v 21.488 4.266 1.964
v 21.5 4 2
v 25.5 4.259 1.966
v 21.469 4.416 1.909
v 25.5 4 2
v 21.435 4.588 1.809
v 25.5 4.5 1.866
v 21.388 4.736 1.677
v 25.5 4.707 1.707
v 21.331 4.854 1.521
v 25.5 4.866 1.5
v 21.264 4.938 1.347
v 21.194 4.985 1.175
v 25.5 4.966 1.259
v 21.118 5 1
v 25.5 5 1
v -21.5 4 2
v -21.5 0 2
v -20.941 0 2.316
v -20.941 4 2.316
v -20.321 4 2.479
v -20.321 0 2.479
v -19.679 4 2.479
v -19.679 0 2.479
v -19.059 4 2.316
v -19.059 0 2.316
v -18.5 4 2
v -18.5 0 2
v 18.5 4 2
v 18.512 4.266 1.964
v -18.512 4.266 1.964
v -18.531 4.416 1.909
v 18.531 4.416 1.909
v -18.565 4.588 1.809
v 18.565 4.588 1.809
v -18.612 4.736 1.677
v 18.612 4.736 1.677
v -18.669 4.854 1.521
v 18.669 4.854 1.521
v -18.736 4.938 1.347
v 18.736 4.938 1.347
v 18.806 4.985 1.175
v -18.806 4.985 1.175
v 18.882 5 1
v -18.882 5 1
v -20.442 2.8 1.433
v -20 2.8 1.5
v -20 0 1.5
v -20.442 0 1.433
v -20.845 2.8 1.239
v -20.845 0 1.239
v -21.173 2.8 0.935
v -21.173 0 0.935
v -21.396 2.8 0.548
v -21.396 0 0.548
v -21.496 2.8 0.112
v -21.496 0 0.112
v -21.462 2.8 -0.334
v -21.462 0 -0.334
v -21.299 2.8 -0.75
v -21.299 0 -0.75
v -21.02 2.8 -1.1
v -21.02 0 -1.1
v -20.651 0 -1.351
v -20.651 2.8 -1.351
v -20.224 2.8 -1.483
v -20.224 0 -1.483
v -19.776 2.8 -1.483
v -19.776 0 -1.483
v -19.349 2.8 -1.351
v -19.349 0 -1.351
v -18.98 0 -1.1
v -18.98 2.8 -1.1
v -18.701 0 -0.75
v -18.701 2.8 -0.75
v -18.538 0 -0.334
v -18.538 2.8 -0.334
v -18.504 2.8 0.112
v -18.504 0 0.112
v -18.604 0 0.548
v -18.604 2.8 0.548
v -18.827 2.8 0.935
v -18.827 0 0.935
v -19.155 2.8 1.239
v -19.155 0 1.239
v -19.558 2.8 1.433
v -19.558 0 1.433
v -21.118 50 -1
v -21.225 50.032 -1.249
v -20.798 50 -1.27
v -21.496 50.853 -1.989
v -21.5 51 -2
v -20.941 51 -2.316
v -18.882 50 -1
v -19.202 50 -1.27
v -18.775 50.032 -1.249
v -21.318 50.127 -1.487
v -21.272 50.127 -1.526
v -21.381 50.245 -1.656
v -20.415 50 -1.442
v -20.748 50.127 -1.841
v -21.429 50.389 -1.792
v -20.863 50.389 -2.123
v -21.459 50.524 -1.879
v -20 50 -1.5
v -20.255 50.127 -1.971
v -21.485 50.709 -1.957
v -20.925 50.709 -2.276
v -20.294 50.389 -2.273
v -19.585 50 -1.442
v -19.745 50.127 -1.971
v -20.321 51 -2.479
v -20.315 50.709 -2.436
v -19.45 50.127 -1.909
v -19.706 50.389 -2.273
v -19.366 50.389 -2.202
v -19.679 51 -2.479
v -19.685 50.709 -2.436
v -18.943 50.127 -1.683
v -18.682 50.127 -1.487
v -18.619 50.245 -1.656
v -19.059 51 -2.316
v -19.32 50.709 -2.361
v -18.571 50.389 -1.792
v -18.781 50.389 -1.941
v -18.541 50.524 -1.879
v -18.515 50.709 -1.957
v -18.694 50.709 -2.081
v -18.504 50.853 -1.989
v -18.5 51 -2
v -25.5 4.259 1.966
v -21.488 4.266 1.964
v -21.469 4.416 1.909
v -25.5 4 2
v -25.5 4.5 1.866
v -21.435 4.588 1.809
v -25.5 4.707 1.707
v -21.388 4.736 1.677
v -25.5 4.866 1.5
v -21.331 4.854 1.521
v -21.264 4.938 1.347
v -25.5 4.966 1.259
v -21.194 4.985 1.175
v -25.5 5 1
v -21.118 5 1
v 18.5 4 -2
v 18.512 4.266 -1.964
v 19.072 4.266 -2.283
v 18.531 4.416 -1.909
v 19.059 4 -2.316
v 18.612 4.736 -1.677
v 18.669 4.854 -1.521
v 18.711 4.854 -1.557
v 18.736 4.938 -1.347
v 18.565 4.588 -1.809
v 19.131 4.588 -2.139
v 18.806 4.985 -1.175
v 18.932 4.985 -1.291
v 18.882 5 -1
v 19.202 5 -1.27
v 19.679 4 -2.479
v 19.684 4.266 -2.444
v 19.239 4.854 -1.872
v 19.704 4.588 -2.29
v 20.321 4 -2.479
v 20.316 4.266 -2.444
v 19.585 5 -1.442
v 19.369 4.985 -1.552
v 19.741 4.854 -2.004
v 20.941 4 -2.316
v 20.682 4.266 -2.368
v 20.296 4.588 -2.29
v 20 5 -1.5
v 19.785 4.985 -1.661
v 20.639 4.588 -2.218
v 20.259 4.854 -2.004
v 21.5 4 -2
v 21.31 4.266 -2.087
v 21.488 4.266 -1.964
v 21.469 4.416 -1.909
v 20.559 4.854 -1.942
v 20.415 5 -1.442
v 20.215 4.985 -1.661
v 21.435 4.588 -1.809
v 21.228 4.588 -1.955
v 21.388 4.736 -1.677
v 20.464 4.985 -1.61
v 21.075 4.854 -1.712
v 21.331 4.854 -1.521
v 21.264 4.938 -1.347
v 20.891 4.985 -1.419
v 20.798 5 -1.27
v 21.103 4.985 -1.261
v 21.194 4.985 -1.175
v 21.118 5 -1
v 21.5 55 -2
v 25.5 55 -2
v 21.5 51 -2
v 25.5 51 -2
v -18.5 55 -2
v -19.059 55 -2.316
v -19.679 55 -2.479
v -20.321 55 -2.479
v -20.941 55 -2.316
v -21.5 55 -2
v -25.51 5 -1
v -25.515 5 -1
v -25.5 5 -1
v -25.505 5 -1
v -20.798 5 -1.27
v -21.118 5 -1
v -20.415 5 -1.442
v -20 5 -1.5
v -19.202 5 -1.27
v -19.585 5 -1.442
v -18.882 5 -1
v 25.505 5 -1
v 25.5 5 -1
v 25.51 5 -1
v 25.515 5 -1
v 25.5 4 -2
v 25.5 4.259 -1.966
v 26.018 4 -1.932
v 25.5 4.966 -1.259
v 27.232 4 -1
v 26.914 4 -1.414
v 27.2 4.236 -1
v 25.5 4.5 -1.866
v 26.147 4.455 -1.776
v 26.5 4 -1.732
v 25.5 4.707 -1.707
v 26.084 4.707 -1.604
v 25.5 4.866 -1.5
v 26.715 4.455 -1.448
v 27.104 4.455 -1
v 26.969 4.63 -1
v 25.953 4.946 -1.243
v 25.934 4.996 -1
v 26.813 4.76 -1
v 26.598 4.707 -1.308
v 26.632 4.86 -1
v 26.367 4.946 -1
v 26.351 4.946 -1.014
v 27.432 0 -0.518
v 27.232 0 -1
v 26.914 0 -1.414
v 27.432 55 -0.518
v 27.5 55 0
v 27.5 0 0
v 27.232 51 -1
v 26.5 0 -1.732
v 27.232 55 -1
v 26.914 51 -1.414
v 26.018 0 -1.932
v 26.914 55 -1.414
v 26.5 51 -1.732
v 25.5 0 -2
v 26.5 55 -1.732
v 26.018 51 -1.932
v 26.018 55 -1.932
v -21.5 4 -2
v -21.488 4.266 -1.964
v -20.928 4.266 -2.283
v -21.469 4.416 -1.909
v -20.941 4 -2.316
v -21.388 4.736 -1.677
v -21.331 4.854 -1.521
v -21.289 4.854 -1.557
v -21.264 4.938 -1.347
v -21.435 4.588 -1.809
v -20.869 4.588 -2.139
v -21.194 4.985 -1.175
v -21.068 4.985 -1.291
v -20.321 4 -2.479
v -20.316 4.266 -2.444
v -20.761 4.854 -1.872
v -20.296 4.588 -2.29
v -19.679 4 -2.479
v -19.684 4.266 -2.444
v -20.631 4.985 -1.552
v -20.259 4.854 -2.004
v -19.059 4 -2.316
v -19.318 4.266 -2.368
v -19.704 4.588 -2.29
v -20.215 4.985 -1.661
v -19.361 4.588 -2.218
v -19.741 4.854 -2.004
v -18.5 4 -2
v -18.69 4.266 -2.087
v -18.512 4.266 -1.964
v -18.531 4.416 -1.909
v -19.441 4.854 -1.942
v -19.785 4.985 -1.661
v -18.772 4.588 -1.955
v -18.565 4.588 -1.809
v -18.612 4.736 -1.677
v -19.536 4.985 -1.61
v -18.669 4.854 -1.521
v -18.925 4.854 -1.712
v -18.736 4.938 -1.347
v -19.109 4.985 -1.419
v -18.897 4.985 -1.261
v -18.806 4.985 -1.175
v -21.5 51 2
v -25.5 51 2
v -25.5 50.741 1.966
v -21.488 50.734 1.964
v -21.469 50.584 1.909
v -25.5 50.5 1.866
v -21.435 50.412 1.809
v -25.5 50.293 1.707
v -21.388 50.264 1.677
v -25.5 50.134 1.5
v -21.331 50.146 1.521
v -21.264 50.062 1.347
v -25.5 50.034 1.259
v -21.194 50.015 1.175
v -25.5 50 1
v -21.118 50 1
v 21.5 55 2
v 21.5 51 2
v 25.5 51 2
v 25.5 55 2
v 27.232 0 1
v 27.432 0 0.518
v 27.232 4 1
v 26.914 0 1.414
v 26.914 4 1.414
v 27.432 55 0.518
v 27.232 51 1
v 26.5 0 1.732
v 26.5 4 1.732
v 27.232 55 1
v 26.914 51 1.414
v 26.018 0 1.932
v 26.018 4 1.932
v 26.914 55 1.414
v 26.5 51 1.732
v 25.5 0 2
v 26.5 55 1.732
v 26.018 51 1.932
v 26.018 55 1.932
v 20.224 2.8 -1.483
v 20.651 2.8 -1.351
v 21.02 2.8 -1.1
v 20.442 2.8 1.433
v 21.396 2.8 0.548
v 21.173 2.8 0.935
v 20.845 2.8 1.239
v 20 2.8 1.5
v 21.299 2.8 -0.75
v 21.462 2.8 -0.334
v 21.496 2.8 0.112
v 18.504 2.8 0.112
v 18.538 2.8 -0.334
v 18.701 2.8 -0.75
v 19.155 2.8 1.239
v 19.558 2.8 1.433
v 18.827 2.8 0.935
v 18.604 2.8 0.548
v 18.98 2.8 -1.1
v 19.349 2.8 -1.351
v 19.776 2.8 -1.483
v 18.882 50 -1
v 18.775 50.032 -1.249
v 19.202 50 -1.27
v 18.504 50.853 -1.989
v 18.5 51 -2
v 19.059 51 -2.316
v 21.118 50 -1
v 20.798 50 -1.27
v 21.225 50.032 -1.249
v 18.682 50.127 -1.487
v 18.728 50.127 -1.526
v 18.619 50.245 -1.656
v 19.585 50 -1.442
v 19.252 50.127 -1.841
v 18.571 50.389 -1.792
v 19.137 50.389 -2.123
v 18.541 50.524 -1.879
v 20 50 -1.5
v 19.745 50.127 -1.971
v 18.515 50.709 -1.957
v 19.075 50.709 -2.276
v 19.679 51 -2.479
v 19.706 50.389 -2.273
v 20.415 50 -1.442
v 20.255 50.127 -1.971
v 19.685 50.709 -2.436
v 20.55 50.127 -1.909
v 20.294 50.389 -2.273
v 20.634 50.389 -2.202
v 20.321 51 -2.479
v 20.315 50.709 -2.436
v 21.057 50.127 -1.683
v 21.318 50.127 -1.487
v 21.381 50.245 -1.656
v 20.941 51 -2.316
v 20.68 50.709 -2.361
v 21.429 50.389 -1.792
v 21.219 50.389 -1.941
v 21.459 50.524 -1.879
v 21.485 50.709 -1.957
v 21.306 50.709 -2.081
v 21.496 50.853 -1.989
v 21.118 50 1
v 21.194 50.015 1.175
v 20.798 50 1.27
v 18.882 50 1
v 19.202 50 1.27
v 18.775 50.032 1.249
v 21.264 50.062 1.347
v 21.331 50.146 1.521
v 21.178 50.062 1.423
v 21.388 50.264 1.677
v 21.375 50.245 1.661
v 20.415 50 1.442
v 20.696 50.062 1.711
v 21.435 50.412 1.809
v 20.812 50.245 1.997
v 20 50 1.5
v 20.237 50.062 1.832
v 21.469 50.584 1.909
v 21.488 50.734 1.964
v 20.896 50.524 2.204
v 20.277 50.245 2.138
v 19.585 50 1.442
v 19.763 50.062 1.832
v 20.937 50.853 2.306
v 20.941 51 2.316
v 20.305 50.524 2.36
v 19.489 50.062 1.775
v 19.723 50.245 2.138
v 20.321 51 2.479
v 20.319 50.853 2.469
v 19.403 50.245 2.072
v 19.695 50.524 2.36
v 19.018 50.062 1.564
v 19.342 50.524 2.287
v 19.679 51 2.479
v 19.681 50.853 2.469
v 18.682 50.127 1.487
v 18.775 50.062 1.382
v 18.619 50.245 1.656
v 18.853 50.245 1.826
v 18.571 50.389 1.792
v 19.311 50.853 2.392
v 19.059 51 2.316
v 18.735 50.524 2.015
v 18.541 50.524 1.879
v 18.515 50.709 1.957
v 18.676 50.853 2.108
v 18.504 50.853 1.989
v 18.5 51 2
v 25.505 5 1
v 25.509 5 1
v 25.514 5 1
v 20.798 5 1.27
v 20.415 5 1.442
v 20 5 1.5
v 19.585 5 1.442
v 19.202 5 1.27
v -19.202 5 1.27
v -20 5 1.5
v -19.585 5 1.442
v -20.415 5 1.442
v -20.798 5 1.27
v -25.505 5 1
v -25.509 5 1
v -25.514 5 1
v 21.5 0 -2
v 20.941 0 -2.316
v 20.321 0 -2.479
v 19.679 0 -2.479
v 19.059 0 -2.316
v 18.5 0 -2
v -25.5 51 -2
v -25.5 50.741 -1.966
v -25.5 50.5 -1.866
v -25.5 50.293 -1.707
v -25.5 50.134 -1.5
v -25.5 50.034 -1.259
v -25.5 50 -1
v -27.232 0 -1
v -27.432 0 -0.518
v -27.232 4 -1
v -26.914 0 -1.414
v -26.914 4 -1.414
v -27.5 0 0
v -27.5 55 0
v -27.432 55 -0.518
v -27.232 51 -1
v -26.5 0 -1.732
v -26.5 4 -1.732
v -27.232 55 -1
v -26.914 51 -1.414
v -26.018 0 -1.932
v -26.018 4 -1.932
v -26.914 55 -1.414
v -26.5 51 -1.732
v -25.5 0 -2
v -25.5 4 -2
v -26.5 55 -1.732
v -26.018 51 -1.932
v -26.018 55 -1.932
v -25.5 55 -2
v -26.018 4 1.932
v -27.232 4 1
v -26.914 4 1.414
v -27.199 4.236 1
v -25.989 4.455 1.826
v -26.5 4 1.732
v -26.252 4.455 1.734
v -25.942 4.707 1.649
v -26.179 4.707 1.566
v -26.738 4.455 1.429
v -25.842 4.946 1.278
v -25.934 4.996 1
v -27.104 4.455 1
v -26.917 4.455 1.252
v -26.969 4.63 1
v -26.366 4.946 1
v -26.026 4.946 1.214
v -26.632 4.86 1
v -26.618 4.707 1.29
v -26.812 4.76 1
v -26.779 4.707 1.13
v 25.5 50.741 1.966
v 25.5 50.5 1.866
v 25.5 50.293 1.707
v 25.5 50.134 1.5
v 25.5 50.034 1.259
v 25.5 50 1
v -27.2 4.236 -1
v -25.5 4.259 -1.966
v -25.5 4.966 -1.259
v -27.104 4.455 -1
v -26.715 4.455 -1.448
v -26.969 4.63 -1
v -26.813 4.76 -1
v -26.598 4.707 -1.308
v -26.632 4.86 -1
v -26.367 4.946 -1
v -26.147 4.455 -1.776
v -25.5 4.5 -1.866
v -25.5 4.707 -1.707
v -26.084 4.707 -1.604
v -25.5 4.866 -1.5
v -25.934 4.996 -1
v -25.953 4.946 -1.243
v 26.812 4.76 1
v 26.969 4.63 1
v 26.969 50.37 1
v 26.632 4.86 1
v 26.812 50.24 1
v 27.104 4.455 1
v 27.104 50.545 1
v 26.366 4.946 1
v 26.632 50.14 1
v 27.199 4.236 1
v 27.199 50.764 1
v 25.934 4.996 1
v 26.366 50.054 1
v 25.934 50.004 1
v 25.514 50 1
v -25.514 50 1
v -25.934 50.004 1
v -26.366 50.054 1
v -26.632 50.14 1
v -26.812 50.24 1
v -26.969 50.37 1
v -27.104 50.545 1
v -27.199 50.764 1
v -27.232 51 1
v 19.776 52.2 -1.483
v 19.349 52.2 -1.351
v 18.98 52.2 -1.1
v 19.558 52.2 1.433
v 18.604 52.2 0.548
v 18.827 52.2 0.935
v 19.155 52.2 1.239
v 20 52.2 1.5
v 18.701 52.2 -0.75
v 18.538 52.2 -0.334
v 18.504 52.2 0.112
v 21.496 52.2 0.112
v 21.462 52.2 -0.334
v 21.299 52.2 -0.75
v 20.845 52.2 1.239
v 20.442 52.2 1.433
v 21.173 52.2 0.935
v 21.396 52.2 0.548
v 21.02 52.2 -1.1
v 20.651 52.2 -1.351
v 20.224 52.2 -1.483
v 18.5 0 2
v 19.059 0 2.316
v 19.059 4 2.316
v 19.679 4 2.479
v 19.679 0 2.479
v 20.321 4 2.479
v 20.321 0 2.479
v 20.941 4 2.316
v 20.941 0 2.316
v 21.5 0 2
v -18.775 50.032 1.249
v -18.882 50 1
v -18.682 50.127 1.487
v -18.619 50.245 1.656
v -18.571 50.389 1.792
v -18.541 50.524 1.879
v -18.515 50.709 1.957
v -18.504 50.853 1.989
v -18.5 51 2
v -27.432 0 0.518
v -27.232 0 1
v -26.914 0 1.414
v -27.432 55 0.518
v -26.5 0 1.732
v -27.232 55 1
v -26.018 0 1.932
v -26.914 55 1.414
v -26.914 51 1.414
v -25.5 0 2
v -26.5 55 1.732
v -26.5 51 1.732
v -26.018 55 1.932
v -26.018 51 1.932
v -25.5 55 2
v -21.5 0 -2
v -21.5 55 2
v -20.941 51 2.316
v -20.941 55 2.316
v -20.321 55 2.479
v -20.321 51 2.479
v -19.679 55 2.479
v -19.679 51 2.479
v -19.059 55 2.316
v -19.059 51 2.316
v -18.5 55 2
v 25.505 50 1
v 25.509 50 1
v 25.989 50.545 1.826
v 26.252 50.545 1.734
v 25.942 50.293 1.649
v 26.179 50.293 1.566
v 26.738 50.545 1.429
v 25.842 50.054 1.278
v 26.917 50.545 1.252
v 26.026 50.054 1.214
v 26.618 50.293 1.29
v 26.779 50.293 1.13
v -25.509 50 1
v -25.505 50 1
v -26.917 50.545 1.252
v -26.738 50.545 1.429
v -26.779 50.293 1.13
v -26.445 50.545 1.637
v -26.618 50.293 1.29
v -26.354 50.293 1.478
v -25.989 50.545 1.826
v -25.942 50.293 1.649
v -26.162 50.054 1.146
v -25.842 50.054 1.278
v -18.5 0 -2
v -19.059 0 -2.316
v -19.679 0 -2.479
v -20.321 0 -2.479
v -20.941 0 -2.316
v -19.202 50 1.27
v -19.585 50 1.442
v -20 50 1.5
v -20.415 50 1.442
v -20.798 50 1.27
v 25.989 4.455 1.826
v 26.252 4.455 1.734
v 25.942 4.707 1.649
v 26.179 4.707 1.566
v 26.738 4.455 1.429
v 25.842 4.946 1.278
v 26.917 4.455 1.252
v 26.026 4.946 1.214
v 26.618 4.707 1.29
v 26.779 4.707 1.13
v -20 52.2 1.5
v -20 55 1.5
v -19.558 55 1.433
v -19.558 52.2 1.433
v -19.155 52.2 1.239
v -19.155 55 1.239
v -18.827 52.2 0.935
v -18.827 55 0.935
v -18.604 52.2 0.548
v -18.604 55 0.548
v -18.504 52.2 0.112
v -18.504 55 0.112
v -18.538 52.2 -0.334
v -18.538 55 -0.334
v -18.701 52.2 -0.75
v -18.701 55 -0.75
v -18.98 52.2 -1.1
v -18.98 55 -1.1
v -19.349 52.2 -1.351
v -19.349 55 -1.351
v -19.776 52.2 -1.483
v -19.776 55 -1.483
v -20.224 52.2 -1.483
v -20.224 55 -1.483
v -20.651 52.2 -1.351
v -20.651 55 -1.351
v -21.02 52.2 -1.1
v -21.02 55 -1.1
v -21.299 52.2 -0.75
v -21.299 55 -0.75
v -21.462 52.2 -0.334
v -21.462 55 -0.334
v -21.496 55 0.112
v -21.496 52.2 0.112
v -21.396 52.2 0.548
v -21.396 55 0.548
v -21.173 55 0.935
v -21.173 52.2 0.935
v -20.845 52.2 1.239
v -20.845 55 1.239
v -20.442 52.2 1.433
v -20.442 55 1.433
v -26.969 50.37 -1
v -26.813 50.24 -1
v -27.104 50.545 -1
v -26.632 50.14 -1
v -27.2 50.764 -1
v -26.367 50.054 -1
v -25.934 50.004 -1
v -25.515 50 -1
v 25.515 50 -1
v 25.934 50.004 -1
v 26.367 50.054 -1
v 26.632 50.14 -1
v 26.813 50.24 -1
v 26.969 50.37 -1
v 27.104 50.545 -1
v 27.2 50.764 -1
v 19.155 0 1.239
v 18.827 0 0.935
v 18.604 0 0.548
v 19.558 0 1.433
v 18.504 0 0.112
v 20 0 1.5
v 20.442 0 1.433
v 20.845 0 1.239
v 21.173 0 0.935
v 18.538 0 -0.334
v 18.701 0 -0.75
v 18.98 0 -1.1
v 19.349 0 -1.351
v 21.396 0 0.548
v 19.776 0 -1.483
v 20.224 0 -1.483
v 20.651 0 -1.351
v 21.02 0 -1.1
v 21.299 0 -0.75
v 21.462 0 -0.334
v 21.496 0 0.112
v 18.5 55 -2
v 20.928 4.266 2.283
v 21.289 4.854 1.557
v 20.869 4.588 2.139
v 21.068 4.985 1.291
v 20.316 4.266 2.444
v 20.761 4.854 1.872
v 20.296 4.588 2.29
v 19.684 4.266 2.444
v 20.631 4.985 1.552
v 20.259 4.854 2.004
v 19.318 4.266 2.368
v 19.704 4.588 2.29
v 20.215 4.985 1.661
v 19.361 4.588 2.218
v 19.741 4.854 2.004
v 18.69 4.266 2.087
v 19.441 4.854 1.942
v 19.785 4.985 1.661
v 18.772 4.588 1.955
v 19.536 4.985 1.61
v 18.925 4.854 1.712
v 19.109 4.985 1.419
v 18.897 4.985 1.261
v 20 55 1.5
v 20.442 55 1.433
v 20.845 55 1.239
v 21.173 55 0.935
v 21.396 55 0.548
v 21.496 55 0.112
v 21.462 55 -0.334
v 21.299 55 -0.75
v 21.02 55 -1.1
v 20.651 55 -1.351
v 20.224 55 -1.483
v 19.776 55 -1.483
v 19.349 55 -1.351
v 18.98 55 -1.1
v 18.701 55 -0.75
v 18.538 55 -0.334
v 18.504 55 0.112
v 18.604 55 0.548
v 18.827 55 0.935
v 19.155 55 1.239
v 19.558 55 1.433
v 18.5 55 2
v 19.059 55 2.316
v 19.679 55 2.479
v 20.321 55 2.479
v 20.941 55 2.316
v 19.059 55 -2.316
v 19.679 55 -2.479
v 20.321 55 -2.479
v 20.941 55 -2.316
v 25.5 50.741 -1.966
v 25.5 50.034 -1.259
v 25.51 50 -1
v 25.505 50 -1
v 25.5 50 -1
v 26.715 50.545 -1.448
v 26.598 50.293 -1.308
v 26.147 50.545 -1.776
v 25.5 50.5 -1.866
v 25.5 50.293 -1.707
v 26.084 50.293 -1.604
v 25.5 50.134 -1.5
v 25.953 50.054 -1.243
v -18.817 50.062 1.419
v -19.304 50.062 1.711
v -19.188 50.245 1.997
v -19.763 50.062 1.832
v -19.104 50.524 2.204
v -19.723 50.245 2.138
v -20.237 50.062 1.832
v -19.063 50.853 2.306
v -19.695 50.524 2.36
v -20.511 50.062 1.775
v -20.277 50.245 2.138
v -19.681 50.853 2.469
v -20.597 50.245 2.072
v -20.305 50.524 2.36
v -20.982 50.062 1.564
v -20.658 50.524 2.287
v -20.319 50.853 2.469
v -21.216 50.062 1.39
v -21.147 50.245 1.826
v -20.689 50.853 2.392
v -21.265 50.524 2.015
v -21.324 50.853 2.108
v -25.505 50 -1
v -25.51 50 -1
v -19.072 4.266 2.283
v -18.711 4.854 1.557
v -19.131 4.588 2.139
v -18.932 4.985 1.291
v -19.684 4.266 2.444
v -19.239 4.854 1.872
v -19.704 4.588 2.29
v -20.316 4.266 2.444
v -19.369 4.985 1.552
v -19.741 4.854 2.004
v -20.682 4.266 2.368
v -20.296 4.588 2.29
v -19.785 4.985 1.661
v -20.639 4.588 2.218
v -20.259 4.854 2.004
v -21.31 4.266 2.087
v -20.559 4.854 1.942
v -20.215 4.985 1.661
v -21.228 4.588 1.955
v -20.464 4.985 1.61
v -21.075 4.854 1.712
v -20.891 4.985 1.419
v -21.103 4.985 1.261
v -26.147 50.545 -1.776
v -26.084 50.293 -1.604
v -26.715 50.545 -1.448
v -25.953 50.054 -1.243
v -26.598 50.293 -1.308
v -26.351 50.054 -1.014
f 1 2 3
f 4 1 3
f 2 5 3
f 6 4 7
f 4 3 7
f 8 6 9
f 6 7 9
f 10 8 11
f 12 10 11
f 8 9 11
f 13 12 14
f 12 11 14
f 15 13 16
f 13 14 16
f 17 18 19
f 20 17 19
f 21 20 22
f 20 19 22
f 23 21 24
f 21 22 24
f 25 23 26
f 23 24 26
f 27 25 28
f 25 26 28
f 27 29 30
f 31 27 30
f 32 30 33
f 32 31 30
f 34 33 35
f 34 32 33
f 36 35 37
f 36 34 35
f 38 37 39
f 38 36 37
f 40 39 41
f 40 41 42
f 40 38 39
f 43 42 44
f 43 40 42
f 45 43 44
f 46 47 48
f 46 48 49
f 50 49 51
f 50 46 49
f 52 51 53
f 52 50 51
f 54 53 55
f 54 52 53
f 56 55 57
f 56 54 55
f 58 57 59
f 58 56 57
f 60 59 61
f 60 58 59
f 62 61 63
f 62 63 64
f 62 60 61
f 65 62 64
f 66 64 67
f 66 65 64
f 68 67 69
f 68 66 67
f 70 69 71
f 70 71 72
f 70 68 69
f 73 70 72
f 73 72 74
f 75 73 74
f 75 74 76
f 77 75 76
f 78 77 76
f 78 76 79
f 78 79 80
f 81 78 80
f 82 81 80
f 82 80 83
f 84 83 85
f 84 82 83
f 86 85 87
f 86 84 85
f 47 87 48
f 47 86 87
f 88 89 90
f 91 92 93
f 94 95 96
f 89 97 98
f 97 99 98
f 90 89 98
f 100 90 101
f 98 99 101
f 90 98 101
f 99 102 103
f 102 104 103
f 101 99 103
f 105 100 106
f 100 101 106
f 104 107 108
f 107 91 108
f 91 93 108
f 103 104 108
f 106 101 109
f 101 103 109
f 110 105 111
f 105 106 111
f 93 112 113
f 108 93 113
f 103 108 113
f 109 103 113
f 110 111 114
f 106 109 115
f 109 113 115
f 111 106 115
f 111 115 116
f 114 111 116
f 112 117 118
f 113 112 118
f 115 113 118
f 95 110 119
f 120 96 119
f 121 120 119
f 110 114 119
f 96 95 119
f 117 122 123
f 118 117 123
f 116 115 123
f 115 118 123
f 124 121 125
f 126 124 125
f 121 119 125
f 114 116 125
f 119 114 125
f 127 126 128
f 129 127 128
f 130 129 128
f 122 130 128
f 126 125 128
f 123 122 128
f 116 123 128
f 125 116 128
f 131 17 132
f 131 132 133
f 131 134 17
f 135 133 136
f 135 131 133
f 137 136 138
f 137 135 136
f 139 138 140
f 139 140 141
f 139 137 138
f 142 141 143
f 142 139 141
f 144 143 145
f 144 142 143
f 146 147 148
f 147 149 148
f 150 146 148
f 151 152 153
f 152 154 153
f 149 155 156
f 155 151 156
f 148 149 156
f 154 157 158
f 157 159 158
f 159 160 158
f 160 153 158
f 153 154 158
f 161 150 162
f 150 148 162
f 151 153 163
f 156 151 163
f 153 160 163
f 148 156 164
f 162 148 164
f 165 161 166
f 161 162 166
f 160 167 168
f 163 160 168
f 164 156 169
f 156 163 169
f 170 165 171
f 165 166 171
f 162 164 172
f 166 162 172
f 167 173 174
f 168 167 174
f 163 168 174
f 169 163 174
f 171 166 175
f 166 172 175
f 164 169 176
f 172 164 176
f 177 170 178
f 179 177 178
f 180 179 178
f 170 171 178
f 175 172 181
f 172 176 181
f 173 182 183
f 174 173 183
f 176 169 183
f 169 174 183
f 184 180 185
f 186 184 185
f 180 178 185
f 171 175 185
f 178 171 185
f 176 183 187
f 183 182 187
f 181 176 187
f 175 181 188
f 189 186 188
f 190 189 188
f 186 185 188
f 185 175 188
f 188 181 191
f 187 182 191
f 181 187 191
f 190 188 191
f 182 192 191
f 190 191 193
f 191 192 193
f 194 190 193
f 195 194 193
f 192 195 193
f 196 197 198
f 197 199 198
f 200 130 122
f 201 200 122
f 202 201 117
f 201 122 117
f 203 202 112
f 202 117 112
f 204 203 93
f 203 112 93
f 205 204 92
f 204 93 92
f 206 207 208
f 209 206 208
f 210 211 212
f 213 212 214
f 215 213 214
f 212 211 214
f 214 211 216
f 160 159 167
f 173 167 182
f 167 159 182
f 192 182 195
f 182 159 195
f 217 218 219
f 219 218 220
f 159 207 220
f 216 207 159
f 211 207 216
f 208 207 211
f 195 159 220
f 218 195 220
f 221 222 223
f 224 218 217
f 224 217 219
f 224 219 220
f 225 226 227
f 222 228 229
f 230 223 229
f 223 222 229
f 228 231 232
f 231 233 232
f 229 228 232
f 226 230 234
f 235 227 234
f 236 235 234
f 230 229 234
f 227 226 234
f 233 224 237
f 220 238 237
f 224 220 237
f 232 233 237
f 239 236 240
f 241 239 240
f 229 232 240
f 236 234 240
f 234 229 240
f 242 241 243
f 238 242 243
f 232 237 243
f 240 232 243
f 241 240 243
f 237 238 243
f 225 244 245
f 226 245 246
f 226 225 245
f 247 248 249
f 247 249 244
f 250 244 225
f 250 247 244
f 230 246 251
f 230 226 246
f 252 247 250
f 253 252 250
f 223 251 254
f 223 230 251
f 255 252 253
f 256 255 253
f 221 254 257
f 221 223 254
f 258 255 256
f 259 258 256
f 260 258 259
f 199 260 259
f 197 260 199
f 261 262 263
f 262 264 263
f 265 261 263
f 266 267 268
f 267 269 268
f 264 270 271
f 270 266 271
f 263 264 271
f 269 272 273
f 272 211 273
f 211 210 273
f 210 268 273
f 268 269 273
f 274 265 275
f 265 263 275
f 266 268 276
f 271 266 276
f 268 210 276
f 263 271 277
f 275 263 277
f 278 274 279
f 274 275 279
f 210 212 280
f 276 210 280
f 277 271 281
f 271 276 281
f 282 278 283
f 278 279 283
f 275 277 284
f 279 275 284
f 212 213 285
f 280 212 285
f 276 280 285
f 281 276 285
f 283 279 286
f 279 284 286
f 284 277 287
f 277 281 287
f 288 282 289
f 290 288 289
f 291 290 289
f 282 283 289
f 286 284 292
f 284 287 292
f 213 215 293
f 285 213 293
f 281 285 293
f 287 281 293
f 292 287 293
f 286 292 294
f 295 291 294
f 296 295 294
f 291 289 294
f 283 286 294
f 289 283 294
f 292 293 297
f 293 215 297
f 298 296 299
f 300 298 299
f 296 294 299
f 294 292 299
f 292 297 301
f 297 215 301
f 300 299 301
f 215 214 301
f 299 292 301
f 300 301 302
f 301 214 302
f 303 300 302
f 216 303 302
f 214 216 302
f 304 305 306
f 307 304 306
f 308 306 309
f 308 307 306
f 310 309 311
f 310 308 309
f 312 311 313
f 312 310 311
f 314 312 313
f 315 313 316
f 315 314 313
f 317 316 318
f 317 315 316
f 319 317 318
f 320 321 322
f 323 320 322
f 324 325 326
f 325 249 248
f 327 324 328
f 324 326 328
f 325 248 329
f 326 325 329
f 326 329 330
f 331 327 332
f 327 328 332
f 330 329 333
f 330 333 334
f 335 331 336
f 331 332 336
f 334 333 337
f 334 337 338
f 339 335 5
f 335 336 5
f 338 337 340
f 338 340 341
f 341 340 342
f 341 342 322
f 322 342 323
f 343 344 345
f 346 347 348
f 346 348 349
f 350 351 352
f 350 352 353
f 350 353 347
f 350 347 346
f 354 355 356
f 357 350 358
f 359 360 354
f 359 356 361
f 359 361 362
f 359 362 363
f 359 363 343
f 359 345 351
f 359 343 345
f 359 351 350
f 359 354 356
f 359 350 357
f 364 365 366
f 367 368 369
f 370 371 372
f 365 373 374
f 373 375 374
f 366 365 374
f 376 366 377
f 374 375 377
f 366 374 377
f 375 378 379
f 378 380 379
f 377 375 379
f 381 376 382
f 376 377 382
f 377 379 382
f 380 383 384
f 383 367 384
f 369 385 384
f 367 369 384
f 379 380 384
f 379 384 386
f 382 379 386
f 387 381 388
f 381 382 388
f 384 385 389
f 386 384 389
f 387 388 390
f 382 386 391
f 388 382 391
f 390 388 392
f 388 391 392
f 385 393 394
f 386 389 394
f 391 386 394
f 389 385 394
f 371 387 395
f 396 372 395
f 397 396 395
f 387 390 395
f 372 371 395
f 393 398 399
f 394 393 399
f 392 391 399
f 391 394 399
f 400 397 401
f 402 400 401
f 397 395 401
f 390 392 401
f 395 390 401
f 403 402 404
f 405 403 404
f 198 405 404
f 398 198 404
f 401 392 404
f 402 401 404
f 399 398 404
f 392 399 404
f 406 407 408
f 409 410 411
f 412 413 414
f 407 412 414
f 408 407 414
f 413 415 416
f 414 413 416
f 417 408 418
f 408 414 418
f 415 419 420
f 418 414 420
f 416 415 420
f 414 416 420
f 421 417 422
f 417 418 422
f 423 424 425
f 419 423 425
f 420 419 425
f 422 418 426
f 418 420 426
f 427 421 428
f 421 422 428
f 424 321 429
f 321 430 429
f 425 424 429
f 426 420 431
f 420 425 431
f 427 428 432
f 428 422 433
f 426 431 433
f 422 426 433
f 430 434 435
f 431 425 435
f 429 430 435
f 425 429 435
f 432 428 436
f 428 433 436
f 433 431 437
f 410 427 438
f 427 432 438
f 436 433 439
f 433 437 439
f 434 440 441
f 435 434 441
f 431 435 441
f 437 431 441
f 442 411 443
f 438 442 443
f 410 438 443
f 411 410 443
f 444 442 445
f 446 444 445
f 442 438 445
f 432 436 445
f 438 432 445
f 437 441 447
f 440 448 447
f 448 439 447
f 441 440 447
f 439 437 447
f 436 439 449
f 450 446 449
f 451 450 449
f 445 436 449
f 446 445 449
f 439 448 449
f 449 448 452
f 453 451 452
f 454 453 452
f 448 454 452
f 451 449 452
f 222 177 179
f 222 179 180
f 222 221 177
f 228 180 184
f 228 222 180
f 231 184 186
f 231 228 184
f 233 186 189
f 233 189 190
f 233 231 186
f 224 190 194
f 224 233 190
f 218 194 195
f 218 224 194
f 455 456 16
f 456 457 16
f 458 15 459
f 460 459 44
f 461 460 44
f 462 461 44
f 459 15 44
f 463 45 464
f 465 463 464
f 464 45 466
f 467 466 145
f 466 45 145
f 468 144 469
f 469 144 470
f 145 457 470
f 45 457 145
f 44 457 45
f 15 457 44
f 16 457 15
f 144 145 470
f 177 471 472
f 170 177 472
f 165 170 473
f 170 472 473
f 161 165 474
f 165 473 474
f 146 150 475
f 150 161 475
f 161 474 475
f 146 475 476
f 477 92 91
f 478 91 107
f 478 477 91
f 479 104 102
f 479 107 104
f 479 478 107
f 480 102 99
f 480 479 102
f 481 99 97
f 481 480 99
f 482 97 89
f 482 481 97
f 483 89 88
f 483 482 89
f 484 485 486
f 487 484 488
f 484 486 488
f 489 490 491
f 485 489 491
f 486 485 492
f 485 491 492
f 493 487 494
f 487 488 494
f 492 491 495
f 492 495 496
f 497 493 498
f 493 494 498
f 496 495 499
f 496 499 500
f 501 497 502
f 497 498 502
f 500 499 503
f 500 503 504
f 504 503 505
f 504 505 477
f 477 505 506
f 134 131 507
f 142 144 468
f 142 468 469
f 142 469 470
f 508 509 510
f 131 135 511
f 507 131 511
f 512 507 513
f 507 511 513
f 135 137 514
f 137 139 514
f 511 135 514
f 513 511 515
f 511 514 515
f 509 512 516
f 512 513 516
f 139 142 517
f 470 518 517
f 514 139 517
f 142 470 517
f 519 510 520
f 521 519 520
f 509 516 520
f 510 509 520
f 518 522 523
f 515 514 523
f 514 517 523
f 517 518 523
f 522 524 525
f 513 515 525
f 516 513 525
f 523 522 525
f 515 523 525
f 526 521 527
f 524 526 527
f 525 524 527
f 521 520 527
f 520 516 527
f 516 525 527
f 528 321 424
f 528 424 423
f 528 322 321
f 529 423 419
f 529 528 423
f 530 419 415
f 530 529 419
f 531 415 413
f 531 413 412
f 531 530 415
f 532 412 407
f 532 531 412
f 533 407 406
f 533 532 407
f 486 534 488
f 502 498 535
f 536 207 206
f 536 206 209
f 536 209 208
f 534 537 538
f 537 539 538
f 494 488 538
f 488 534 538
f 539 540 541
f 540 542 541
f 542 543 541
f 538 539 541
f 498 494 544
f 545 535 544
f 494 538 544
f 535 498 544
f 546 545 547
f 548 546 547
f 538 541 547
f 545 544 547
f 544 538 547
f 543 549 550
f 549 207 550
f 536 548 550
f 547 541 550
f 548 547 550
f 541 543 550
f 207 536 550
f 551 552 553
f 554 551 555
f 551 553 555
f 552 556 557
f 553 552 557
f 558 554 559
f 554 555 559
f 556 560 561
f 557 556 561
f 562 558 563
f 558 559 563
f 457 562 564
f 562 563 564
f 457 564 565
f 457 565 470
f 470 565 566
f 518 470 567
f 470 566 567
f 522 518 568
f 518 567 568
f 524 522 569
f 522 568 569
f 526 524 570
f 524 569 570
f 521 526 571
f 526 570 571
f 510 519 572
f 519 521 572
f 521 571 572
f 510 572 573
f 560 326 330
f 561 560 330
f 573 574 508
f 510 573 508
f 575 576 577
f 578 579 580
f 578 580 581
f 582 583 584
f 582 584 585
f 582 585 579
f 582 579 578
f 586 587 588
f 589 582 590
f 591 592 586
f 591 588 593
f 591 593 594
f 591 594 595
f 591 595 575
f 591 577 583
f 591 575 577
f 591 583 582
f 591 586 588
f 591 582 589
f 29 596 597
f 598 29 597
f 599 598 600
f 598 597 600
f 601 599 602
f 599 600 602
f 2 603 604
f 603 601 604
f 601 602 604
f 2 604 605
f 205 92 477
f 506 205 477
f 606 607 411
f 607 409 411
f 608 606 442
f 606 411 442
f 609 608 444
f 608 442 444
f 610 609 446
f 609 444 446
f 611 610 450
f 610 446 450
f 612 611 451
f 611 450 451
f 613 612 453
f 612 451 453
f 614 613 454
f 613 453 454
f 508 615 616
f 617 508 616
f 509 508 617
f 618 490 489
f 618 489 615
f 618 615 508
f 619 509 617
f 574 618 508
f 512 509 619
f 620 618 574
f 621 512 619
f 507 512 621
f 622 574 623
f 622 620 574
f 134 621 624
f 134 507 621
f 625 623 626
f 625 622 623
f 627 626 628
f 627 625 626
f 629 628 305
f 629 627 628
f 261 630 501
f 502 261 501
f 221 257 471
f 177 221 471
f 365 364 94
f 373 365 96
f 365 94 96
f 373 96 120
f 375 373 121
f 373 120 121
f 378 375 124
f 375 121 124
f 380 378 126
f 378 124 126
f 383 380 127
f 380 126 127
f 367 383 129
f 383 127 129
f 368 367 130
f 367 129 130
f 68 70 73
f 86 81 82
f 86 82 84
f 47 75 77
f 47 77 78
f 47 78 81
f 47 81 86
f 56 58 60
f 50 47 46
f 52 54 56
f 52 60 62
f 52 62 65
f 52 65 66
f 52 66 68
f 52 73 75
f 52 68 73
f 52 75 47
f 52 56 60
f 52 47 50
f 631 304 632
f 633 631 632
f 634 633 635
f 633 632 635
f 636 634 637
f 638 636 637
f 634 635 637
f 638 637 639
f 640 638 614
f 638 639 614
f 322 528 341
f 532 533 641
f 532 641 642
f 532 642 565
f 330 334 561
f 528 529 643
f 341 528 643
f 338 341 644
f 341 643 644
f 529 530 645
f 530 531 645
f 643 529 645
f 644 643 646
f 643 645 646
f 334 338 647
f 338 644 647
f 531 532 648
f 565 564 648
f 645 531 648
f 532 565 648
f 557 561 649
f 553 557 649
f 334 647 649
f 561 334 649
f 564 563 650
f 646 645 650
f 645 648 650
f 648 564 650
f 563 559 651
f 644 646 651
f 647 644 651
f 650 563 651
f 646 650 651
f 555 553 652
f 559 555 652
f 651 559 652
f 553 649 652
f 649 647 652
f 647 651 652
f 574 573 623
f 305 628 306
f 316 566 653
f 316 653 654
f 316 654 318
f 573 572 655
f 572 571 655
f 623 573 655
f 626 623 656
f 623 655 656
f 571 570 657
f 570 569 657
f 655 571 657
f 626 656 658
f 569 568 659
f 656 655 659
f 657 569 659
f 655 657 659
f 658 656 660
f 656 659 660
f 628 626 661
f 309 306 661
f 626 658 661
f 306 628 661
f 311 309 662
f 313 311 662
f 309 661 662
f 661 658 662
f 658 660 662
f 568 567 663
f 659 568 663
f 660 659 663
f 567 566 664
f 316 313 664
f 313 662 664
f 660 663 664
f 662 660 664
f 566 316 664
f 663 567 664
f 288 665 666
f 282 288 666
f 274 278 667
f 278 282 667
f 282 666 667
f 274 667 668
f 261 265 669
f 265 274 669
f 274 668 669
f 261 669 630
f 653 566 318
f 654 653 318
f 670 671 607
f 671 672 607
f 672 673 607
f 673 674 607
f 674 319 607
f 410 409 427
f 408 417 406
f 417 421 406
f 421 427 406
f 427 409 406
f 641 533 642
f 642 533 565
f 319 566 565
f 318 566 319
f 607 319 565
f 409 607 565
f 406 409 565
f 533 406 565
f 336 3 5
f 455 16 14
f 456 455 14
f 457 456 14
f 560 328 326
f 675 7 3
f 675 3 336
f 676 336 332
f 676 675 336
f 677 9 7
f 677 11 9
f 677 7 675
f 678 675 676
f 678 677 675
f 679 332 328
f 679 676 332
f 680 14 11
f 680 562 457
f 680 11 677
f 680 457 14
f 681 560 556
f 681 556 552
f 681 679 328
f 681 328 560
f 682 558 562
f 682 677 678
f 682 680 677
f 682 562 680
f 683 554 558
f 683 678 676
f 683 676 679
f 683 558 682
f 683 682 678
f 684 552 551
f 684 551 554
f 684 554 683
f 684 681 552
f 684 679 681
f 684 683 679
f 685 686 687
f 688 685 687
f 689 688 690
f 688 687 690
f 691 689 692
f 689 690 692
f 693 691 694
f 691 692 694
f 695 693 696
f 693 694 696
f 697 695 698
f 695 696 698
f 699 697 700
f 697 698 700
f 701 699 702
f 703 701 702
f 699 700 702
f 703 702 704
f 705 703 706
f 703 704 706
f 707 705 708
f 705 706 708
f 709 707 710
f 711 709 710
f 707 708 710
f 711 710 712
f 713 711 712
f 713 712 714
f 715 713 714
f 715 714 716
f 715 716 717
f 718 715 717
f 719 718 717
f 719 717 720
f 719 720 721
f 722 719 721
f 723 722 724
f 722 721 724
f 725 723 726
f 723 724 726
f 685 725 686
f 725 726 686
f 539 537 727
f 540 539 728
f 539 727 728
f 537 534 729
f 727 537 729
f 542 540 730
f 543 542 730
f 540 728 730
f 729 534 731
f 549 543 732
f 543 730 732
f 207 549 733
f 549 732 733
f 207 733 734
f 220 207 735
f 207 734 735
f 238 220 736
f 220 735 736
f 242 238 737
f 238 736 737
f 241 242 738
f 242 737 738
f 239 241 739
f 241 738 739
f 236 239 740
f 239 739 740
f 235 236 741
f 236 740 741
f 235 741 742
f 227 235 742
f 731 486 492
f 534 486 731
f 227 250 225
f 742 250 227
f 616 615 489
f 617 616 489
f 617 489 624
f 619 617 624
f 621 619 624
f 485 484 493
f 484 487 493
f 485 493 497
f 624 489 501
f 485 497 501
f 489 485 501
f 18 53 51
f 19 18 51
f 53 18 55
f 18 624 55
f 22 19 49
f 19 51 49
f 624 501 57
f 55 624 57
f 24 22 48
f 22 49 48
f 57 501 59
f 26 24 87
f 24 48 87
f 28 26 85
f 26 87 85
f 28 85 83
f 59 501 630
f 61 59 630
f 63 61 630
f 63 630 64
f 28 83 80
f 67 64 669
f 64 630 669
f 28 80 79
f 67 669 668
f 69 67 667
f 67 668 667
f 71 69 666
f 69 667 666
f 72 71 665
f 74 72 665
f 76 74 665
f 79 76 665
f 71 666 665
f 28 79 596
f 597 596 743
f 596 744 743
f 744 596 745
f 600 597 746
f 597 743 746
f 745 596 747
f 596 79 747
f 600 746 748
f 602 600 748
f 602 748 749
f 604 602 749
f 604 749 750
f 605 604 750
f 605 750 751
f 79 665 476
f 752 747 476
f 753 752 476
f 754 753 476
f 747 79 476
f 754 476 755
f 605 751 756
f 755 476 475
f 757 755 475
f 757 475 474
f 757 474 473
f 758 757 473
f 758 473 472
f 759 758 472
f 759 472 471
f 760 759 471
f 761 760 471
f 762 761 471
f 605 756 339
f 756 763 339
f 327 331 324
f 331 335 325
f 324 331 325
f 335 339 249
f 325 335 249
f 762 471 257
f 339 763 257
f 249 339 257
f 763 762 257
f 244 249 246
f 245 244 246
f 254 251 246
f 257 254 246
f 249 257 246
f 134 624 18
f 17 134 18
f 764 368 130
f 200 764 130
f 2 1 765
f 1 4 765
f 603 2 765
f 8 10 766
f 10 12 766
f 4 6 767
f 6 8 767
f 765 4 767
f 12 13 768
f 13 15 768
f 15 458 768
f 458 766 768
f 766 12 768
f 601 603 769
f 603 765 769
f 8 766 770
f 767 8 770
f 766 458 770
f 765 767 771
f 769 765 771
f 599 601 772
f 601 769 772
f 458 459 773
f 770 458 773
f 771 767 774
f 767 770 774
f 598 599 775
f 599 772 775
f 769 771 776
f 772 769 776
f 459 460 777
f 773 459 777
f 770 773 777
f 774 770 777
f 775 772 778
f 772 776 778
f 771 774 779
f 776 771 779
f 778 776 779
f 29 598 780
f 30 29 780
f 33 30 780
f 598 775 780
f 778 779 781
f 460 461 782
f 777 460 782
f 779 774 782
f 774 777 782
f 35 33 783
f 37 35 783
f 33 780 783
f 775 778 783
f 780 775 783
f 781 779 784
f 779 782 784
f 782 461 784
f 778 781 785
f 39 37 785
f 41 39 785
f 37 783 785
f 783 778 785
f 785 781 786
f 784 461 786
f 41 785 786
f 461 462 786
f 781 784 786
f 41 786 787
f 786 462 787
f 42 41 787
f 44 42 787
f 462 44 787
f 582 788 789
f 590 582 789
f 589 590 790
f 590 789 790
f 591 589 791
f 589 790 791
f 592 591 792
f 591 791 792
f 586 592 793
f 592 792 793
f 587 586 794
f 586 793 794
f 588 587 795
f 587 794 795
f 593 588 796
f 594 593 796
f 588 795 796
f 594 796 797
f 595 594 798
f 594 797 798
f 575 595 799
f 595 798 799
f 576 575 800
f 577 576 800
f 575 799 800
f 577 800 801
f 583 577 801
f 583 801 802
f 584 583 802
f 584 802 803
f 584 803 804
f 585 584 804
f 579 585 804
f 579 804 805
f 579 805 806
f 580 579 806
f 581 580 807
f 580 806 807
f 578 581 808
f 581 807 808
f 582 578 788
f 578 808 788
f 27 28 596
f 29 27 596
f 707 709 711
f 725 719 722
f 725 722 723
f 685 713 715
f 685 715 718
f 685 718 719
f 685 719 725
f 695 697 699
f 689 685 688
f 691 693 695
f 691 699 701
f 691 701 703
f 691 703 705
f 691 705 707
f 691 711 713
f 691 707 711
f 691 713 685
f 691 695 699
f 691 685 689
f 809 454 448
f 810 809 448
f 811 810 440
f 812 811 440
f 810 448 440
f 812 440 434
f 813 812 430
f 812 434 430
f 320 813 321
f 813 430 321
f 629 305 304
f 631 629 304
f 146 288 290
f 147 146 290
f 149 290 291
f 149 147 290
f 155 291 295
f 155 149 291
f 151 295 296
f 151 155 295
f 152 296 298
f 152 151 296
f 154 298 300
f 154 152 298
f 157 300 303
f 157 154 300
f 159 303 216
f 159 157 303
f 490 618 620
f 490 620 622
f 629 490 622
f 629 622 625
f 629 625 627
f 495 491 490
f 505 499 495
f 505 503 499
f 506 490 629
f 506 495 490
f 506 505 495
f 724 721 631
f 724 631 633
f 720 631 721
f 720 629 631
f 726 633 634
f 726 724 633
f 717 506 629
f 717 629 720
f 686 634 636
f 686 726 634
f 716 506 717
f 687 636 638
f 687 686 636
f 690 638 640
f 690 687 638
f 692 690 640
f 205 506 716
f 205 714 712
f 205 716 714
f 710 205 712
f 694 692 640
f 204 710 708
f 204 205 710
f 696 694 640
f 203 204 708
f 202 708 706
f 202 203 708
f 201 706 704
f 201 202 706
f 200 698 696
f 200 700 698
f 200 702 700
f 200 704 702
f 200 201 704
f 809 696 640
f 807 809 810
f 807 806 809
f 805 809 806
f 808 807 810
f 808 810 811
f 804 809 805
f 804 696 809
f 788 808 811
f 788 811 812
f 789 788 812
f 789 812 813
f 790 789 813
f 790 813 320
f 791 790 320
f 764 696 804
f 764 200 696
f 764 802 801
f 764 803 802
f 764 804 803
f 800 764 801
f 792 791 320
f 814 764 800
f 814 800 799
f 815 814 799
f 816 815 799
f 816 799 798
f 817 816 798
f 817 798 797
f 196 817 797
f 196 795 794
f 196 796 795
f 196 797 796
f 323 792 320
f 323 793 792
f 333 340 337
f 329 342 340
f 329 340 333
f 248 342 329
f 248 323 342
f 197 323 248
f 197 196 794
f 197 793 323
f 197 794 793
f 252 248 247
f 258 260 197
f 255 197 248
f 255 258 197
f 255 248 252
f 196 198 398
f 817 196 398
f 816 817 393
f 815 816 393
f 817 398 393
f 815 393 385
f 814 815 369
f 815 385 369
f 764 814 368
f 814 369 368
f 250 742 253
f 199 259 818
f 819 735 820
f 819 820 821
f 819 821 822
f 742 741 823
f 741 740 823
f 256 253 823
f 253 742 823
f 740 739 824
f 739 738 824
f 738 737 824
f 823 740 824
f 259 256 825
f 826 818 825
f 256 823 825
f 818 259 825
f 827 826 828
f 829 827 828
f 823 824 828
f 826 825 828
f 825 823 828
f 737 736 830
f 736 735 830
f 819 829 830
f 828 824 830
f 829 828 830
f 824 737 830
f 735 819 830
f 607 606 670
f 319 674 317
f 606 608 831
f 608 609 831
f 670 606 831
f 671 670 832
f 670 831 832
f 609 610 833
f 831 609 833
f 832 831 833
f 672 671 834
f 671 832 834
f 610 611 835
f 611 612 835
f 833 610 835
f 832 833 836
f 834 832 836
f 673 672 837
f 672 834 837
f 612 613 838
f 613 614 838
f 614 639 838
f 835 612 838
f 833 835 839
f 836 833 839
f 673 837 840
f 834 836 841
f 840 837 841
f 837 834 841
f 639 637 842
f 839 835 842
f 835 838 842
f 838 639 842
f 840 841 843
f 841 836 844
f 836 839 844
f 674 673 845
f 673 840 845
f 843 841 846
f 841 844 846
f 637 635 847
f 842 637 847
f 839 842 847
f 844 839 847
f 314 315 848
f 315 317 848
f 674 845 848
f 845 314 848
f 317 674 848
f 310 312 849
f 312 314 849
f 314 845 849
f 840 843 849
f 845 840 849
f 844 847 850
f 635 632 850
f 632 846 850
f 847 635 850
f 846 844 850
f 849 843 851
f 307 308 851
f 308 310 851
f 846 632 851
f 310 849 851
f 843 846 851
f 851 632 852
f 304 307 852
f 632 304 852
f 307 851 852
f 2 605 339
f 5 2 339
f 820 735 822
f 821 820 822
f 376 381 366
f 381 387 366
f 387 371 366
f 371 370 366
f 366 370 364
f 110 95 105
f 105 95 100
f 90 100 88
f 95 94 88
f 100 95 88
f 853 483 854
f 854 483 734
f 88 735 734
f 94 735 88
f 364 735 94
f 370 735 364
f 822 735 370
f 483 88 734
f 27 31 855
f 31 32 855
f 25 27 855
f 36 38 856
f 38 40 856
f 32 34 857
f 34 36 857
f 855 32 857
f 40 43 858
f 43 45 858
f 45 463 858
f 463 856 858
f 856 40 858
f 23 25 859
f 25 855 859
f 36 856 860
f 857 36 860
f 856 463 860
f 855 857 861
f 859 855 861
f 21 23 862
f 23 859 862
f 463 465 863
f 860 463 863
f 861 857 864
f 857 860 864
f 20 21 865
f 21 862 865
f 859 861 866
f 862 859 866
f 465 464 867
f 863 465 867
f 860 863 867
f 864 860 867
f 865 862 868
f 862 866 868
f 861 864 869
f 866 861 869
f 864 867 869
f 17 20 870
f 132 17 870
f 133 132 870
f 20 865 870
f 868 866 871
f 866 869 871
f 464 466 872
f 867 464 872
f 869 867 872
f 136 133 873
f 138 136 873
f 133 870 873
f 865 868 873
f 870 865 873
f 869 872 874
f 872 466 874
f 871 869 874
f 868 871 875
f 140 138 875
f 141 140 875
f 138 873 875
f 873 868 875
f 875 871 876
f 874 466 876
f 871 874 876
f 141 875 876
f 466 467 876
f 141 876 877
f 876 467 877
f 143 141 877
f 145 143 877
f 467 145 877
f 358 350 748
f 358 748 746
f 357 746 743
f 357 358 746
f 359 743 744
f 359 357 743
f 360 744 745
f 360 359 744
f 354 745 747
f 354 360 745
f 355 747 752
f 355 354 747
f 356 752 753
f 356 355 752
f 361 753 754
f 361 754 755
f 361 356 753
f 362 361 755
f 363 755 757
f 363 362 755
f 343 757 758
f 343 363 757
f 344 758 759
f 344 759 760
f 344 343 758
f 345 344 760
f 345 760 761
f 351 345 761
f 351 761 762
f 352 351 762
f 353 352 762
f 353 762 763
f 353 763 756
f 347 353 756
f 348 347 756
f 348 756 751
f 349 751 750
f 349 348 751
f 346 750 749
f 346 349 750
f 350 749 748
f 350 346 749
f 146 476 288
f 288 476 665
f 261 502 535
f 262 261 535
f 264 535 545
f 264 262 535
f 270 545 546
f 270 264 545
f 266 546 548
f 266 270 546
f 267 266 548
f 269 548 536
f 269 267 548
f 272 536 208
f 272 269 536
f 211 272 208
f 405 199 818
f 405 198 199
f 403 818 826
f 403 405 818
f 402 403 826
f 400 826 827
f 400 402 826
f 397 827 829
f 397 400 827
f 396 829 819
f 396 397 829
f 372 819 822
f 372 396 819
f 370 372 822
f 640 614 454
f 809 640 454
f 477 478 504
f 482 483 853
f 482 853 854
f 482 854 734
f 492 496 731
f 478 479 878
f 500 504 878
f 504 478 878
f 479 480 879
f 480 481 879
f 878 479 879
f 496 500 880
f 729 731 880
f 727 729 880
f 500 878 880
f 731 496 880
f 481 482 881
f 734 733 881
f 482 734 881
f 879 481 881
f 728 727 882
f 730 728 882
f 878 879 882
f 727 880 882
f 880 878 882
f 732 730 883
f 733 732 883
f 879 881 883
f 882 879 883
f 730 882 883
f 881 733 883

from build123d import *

# Parameters (mm, degrees)
BOSS_EXTRUDE1_DEPTH     = 55
SKETCH2_R               = 1.5000000000000007
CUT_EXTRUDE1_DEPTH      = 2.8
CUT_EXTRUDE2_START      = -2.8
SKETCH3_R               = 1.5000000000000007
CUT_EXTRUDE2_DEPTH      = 2.8
CUT_EXTRUDE3_DEPTH      = 5
CUT_EXTRUDE3_DEPTH_BACK = 1
CUT_EXTRUDE4_DEPTH      = 1
CUT_EXTRUDE4_DEPTH_BACK = 1
FILLET1_R               = 2
FILLET2_R               = 1


with BuildPart() as part:
    # Sketch1 → Boss-Extrude1 (new body)
    with BuildSketch(Plane(origin=(0, 0, 0), x_dir=(1, 0, 0), z_dir=(0, 1, 0))):
        with BuildLine():
            Line((-18.500000000000032, 1.9999999999999996), (-21.500000000000068, 1.9999999999999996))
            ThreePointArc((-21.500000000000053, 1.9999999999999463), (-22.499999999999986, -1.91e-15), (-21.50000000000005, -1.9999999999999476))
            Line((-21.500000000000064, -2.0000000000000004), (-18.500000000000036, -2.0000000000000004))
            ThreePointArc((-18.50000000000003, -2.0000000000000226), (-17.763932022500214, -1.1180339887499129), (-17.499999999999993, -6.1e-16))
            ThreePointArc((-17.499999999999993, 0), (-17.763932022500214, 1.1180339887499113), (-18.500000000000025, 2.0000000000000213))
        make_face()
        with BuildLine():
            ThreePointArc((-18.500000000000025, 2.000000000000021), (-20.00000000000005, 2.4999999999999947), (-21.500000000000053, 1.9999999999999463))
            Line((-21.500000000000068, 1.9999999999999996), (-18.500000000000032, 1.9999999999999996))
        make_face()
        with BuildLine():
            Line((-18.500000000000036, -2.0000000000000004), (-21.500000000000064, -2.0000000000000004))
            ThreePointArc((-21.50000000000005, -1.9999999999999476), (-20.000000000000053, -2.4999999999999947), (-18.50000000000003, -2.0000000000000226))
        make_face()
        with BuildLine():
            Line((-21.500000000000068, 1.9999999999999996), (-27.49999999999999, 1.9999999999999996))
            Line((-27.49999999999999, 1.9999999999999996), (-27.49999999999999, -2.0000000000000004))
            Line((-27.49999999999999, -2.0000000000000004), (-21.500000000000064, -2.0000000000000004))
            ThreePointArc((-21.50000000000005, -1.9999999999999476), (-22.499999999999986, -1.91e-15), (-21.500000000000053, 1.9999999999999463))
        make_face()
        with BuildLine():
            Line((18.49999999999991, 1.9999999999999996), (-18.500000000000032, 1.9999999999999996))
            ThreePointArc((-18.500000000000025, 2.0000000000000213), (-17.763932022500214, 1.1180339887499113), (-17.499999999999993, 0))
            ThreePointArc((-17.499999999999993, -6.1e-16), (-17.763932022500214, -1.1180339887499129), (-18.50000000000003, -2.0000000000000226))
            Line((-18.500000000000036, -2.0000000000000004), (18.499999999999925, -2.0000000000000004))
            ThreePointArc((18.499999999999932, -1.9999999999999478), (17.5, -1.91e-15), (18.49999999999993, 1.9999999999999456))
        make_face()
        with BuildLine():
            ThreePointArc((21.49999999999997, 2.00000000000002), (19.99999999999994, 2.4999999999999982), (18.49999999999993, 1.9999999999999456))
            Line((18.49999999999991, 1.9999999999999996), (21.499999999999968, 1.9999999999999996))
        make_face()
        with BuildLine():
            Line((21.499999999999968, 1.9999999999999996), (18.49999999999991, 1.9999999999999996))
            ThreePointArc((18.49999999999993, 1.9999999999999456), (17.5, -1.91e-15), (18.499999999999932, -1.9999999999999478))
            Line((18.49999999999992, -2.0000000000000004), (21.499999999999954, -2.0000000000000004))
            ThreePointArc((21.499999999999964, -2.0000000000000244), (22.23606797749978, -1.1180339887499124), (22.5, -6.1e-16))
            ThreePointArc((22.5, 0), (22.23606797749978, 1.11803398874991), (21.49999999999997, 2.00000000000002))
        make_face()
        with BuildLine():
            Line((21.499999999999954, -2.0000000000000004), (18.49999999999992, -2.0000000000000004))
            ThreePointArc((18.499999999999932, -1.9999999999999478), (19.999999999999936, -2.4999999999999982), (21.499999999999964, -2.0000000000000244))
        make_face()
        with BuildLine():
            Line((27.50000000000001, 1.9999999999999996), (21.499999999999968, 1.9999999999999996))
            ThreePointArc((21.49999999999997, 2.00000000000002), (22.23606797749978, 1.11803398874991), (22.5, 0))
            ThreePointArc((22.5, -6.1e-16), (22.23606797749978, -1.1180339887499124), (21.499999999999964, -2.0000000000000244))
            Line((21.499999999999954, -2.0000000000000004), (27.50000000000001, -2.0000000000000004))
            Line((27.50000000000001, -2.0000000000000004), (27.50000000000001, 1.9999999999999996))
        make_face()
    extrude(amount=BOSS_EXTRUDE1_DEPTH)

    # Sketch2 → Cut-Extrude1 (cut)
    with BuildSketch(Plane(origin=(0, 55, 0), x_dir=(1, 0, 0), z_dir=(0, 1, 0))):
        with Locations(Location((-19.99999999999999, 0, 0), (0, 0, 270))):
            Circle(SKETCH2_R)
        with Locations(Location((20, 0, 0), (0, 0, 270))):
            Circle(SKETCH2_R)
    extrude(amount=-CUT_EXTRUDE1_DEPTH, mode=Mode.SUBTRACT)

    # Sketch3 → Cut-Extrude2 (cut)
    with BuildSketch(Plane.XZ.offset(CUT_EXTRUDE2_START)):
        with Locations(Location((-19.99999999999999, 0, 0), (0, 0, 90))):
            Circle(SKETCH3_R)
        with Locations(Location((20, 0, 0), (0, 0, 90))):
            Circle(SKETCH3_R)
    extrude(amount=CUT_EXTRUDE2_DEPTH, mode=Mode.SUBTRACT)

    # Sketch4 → Cut-Extrude3 (cut, two sides: drawn at the far end of the back side and taken through both)
    with BuildSketch(Plane.XY.offset(2.0000000000000004).offset(-CUT_EXTRUDE3_DEPTH_BACK)):
        Polygon((-27.500000000000018, 50), (27.500000000000007, 50), (27.50000000000001, 5.000000000000008), (-27.50000000000001, 5.000000000000008), align=None)
    extrude(amount=CUT_EXTRUDE3_DEPTH + CUT_EXTRUDE3_DEPTH_BACK, mode=Mode.SUBTRACT)

    # Sketch5 → Cut-Extrude4 (cut, two sides: drawn at the far end of the back side and taken through both)
    with BuildSketch(Plane(origin=(0, 0, -1.9999999999999996), x_dir=(-1, 0, 0), z_dir=(0, 0, -1)).offset(-CUT_EXTRUDE4_DEPTH_BACK)):
        Polygon((-27.49999999999999, 50), (27.49999999999999, 50), (27.499999999999986, 5.000000000000001), (-27.49999999999998, 5.000000000000001), align=None)
    extrude(amount=CUT_EXTRUDE4_DEPTH + CUT_EXTRUDE4_DEPTH_BACK, mode=Mode.SUBTRACT)

    # Fillet1
    fillet1_edges = [part.edges().sort_by_distance(p)[0] for p in [
        (-27.49999999999999, 52.5, 2.0000000000000004),
    ]]
    fillet(fillet1_edges, radius=FILLET1_R)
    fillet1_2_edges = [part.edges().sort_by_distance(p)[0] for p in [
        (-27.49999999999999, 2.5000000000000004, -1.9999999999999996),
    ]]
    fillet(fillet1_2_edges, radius=FILLET1_R - 0.0004)  # a hair under: the kernel refuses the full size
    fillet1_3_edges = [part.edges().sort_by_distance(p)[0] for p in [
        (27.50000000000001, 52.5, 2.0000000000000004),
    ]]
    fillet(fillet1_3_edges, radius=FILLET1_R)
    fillet1_4_edges = [part.edges().sort_by_distance(p)[0] for p in [
        (27.50000000000001, 2.5000000000000004, -1.9999999999999996),
    ]]
    fillet(fillet1_4_edges, radius=FILLET1_R - 0.0004)  # a hair under: the kernel refuses the full size

    # Fillet2
    fillet2_edges = [part.edges().sort_by_distance(p)[0] for p in [
        (-19.999999999999986, 50, -2.499999999999992),
        (19.999999999999996, 50, -2.500000000000009),
        (19.999999999999996, 5.000000000000001, -2.500000000000009),
        (-19.999999999999986, 5.000000000000001, -2.499999999999992),
        (-5.684e-14, 50, -1.9999999999999996),
        (23.500199999999992, 5.000000000000001, -1.9999999999999996),
        (-5.151e-14, 5.000000000000001, -1.9999999999999996),
        (23.500200169244646, 50, -1.9999999999999996),
        (-26.5002999949995, 50, -1.7320466614179624),
        (26.50030014156478, 50, -1.7320465767871778),
        (-23.500200000000024, 5.000000000000001, -1.9999999999999996),
        (-26.50029999499948, 5.000000000000001, -1.7320466614179733),
        (26.500299994999555, 5.000000000000001, -1.732046661417944),
        (-23.500000000000025, 5.000000000000008, 2.0000000000000004),
        (-26.49999999999999, 5.000000000000007, 1.7320508075688776),
        (26.500000103238282, 5.000000000000007, 1.7320507479642298),
        (23.499999999999982, 50, 2.0000000000000004),
        (-26.499999999999982, 50, 1.7320508075688823),
        (26.50000000000001, 50, 1.732050807568878),
        (-20.000000000000053, 50, 2.4999999999999925),
        (-23.50000000000002, 50, 2.0000000000000004),
        (19.999999999999932, 50, 2.499999999999999),
        (-5.329e-14, 50, 2.0000000000000004),
        (-20.000000000000053, 5.000000000000008, 2.4999999999999925),
        (-5.507e-14, 5.000000000000008, 2.0000000000000004),
        (19.999999999999932, 5.000000000000008, 2.499999999999999),
        (23.500000119209272, 5.000000000000008, 2.0000000000000004),
        (-23.500200000000024, 50, -1.9999999999999996),
    ]]
    fillet(fillet2_edges, radius=FILLET2_R - 0.0001)  # a hair under: the kernel refuses the full size


solid = part.part
